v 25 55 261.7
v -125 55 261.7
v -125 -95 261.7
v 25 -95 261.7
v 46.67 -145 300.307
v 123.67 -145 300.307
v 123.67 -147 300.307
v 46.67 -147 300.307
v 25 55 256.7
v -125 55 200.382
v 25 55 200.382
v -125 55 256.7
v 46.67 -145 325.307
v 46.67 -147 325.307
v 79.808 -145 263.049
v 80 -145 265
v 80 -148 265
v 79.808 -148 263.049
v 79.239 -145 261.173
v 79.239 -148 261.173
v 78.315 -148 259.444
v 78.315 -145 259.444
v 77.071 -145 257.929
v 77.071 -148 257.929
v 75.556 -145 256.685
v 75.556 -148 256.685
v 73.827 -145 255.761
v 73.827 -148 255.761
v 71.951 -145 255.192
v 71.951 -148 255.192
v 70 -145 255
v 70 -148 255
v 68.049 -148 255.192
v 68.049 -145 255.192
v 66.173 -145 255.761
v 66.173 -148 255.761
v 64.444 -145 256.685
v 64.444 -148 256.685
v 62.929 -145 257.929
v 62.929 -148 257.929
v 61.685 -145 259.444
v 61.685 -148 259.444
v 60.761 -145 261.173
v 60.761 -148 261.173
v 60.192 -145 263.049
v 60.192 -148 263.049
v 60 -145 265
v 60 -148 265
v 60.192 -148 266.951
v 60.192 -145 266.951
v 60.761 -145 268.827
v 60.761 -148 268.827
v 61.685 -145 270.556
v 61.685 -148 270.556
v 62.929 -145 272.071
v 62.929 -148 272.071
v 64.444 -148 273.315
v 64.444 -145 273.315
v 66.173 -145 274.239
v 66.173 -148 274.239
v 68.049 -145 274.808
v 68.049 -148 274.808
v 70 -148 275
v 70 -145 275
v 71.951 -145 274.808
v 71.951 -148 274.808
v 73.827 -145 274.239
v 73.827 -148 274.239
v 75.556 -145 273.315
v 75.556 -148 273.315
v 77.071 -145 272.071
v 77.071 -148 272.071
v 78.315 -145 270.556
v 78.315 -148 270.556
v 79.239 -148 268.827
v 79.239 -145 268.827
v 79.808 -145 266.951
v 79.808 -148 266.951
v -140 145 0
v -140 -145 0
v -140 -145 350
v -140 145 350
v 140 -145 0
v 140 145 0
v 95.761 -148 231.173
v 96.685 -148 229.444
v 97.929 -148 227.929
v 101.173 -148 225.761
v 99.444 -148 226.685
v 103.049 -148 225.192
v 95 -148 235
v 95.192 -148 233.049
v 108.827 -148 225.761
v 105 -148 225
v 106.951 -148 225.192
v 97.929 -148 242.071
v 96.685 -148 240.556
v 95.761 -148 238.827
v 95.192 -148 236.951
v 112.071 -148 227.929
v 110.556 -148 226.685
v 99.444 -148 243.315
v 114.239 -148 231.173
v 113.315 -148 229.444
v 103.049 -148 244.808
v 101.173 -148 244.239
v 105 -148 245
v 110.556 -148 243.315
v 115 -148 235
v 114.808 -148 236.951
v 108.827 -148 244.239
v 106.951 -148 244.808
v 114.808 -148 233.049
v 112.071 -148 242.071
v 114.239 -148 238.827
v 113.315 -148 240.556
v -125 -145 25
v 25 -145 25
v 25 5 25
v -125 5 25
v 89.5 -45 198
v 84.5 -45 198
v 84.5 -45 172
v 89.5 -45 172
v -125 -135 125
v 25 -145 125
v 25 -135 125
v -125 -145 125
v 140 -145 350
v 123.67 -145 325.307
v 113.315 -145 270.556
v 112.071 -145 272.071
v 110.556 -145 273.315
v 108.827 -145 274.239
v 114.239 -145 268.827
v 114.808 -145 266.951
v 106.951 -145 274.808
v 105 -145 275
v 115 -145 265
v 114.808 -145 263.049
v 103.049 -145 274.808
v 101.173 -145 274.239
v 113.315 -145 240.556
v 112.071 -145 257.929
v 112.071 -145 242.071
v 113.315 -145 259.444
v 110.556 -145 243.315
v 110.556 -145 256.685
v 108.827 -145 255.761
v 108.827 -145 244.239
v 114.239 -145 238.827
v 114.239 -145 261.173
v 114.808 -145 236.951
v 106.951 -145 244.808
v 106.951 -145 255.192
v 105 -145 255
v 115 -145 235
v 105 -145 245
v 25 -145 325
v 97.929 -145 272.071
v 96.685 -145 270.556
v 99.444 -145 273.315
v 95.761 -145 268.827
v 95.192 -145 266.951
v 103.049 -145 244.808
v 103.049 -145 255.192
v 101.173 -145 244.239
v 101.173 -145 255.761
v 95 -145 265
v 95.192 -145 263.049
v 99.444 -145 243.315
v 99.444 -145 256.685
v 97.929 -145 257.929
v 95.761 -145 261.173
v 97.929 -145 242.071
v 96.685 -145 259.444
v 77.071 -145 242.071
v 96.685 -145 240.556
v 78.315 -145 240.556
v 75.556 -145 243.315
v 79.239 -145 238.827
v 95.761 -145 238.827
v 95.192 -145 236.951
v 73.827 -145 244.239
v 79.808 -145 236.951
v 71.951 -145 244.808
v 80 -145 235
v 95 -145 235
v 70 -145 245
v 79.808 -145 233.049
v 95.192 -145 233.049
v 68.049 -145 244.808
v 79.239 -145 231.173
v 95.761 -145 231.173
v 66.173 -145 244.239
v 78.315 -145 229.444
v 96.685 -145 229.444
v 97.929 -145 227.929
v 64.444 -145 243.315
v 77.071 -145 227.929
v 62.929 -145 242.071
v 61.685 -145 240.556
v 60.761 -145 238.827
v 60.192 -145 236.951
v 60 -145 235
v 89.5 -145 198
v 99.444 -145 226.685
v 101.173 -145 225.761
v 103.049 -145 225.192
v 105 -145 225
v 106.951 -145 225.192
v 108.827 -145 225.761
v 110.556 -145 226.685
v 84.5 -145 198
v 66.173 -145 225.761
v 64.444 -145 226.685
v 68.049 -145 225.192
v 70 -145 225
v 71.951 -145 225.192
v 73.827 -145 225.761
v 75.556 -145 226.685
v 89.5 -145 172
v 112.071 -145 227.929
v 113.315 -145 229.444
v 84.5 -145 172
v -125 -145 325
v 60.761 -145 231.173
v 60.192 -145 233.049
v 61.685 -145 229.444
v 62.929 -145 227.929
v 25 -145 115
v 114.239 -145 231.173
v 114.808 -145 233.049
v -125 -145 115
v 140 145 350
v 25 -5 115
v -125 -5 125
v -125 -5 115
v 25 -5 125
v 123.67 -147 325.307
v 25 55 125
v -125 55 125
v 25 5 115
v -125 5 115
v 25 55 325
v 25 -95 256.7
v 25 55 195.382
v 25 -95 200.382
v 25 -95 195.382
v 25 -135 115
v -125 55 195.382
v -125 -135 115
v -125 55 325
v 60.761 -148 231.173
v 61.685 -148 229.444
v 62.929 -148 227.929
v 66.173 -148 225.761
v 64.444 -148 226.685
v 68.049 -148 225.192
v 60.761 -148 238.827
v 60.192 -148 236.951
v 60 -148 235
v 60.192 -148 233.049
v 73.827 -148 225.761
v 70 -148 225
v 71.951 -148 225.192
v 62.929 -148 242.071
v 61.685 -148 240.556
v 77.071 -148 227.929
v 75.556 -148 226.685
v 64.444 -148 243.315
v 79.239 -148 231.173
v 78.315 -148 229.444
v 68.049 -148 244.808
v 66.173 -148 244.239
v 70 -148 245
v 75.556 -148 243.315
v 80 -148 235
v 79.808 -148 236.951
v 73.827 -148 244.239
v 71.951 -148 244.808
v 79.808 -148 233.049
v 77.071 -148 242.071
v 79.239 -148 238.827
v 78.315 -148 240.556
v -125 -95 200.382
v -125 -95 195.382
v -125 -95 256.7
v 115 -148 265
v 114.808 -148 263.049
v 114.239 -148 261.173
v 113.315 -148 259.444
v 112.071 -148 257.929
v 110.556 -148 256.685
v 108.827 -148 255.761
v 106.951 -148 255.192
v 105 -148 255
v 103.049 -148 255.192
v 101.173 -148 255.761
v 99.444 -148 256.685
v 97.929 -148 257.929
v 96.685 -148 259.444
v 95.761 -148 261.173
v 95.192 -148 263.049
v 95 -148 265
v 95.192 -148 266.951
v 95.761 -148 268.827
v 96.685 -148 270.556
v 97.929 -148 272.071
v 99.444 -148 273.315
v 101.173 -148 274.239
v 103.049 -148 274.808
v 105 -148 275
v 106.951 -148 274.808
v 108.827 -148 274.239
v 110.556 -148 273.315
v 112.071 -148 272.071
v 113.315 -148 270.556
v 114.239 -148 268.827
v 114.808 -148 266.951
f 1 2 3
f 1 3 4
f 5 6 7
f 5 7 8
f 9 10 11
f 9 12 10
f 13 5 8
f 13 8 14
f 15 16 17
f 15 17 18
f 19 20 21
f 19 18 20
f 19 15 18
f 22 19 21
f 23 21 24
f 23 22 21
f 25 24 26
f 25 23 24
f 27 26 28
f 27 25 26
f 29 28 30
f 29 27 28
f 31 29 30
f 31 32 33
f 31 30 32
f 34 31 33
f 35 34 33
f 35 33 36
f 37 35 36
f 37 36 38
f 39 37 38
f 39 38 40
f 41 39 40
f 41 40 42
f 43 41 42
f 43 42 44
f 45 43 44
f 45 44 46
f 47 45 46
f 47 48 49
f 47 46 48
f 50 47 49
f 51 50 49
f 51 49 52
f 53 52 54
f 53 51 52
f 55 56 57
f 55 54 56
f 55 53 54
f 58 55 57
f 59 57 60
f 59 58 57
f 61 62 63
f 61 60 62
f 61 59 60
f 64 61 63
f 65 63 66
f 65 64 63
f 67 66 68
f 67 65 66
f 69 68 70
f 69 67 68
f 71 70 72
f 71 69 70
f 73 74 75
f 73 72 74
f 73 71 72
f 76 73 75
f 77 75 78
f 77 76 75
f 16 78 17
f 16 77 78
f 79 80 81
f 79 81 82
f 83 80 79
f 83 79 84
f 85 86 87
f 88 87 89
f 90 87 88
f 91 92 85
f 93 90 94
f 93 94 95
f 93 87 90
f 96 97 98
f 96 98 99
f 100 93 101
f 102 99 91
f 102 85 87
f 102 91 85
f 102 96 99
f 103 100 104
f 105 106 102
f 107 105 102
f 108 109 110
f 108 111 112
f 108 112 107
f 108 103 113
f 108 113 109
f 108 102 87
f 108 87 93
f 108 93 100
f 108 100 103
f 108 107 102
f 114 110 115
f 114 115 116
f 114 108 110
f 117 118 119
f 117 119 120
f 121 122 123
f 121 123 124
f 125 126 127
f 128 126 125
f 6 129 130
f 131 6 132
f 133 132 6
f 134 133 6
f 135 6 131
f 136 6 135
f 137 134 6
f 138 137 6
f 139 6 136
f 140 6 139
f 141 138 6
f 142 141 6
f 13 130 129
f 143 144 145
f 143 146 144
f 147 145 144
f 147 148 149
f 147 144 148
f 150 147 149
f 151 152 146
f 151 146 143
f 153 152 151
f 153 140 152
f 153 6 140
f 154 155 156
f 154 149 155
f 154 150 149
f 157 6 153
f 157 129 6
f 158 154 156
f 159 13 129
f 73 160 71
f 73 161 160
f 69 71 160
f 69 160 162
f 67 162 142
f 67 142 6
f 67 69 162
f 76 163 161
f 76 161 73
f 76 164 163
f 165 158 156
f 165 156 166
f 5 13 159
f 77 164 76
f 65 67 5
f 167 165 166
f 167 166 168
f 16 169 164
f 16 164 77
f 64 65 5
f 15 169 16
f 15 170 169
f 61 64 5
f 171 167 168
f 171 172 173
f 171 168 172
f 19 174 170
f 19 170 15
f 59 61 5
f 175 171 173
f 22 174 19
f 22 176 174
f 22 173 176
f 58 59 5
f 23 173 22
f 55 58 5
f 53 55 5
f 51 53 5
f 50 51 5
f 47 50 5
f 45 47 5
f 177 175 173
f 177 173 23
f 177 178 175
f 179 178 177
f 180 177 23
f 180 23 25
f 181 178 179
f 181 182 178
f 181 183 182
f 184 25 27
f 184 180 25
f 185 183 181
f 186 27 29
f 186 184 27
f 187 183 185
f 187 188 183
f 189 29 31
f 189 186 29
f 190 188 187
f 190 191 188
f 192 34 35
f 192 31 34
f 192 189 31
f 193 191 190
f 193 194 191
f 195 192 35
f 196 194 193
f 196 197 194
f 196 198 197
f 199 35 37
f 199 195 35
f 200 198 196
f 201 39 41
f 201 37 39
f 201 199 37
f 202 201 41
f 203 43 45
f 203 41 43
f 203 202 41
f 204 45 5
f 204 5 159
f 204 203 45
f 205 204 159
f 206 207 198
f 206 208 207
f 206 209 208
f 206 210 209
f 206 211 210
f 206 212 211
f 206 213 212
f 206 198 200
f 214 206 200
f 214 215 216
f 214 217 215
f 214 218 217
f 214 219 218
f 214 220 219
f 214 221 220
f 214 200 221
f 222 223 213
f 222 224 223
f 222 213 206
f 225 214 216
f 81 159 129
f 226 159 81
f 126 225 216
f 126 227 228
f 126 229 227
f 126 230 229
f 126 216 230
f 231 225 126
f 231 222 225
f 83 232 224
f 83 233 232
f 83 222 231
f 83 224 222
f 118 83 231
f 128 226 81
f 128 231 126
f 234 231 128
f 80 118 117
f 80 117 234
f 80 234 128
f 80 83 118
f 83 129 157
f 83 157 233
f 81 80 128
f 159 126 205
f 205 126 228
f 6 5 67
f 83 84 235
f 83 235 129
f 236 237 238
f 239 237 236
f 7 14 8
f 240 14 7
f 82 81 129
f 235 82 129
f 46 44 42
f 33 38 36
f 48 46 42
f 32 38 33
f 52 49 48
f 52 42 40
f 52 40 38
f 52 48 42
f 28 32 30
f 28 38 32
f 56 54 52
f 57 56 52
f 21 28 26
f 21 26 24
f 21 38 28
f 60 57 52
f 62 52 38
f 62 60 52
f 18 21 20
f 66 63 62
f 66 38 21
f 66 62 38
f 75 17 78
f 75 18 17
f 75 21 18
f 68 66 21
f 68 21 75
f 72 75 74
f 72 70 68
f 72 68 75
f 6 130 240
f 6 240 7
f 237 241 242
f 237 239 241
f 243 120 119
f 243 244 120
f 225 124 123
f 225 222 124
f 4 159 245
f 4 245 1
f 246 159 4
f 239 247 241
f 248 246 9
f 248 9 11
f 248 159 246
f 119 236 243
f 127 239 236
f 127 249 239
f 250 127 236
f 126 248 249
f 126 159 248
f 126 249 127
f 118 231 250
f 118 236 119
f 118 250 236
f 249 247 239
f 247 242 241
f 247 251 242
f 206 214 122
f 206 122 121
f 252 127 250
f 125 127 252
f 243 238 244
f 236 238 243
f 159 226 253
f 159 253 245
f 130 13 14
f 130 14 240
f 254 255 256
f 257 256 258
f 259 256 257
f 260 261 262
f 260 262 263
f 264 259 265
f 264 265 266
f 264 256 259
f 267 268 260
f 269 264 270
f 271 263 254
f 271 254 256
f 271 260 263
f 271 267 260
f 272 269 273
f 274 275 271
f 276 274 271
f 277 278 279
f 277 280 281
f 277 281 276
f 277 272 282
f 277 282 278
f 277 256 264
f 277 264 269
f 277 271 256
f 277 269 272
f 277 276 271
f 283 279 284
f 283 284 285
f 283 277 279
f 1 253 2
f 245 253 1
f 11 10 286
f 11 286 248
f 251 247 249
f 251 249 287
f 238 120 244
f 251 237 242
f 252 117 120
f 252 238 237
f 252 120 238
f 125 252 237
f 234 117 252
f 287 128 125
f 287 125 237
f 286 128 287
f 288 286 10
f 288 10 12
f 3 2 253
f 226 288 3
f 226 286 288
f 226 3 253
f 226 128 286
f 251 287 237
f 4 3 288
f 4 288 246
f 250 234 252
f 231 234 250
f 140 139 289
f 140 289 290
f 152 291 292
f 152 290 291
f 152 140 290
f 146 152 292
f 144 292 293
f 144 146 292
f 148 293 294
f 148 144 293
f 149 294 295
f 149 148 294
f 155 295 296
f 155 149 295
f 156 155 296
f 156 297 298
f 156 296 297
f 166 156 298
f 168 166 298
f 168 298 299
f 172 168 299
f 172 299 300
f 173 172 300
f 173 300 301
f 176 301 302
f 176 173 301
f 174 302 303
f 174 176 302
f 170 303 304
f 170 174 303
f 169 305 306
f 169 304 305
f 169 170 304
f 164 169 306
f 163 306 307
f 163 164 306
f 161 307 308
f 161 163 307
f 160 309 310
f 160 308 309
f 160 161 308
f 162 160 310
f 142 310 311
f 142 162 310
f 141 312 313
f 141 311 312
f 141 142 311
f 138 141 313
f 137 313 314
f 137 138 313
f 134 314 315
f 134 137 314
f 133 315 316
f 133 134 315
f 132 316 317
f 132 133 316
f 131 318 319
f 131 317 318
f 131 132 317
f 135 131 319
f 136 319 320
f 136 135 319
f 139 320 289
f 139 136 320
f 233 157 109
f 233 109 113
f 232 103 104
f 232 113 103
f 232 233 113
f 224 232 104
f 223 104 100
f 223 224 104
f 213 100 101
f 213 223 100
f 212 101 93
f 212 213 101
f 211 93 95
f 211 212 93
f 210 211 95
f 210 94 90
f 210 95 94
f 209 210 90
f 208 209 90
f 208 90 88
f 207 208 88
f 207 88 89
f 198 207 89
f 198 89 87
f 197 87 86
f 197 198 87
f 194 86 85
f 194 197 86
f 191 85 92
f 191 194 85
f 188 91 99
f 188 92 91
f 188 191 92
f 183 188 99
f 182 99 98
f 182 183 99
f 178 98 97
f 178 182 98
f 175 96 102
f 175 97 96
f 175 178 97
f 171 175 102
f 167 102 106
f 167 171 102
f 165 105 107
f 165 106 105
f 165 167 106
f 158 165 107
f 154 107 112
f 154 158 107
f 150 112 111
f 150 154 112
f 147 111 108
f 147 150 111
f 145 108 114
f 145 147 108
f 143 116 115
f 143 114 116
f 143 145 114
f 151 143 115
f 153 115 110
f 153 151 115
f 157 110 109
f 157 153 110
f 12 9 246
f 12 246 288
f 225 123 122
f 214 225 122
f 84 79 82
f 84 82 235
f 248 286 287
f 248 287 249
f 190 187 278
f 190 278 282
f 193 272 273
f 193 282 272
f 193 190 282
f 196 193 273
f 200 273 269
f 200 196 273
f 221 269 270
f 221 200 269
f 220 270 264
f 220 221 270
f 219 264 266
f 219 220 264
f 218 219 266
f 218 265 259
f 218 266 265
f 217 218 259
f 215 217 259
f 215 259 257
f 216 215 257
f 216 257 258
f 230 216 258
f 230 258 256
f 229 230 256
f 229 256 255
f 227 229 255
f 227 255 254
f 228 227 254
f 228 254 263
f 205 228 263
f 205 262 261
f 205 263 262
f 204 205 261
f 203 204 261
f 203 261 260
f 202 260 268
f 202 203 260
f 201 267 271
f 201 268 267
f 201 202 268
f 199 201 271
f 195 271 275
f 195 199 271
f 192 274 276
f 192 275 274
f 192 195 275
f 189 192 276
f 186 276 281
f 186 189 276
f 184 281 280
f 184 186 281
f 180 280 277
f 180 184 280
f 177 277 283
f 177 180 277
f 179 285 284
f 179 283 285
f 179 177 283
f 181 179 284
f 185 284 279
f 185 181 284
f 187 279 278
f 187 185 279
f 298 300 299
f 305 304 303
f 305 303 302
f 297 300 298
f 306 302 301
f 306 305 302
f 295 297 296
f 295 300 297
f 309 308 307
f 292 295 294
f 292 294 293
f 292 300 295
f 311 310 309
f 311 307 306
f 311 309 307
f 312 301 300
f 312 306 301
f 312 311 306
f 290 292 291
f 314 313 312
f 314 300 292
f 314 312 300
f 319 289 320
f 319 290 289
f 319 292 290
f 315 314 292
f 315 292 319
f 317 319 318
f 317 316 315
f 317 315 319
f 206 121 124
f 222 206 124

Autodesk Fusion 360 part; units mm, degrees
sketch "Sketch1" plane through (0, 0, 0) normal (0, 0, 1) x (1, 0, 0)
  line L0 (140, -145) -> (-140, -145)
  line L1 (-140, -145) -> (-140, 145)
  line L2 (-140, 145) -> (140, 145)
  line L3 (140, 145) -> (140, -145)
  line L4 (140, -145) -> (-140, 145) construction
  line L5 (-140, -145) -> (140, 145) construction
  dimension "d1" = 280
  dimension "d2" = 290
extrude "Extrude1" add sketch "Sketch1" along normal blind 350
sketch "Sketch2" plane through (0, -145, 0) normal (0, -1, 0) x (1, 0, 0)
  line L0 (-140, 0) -> (140, 0)
  line L1 (140, 0) -> (140, 350)
  line L2 (140, 350) -> (-140, 350)
  line L3 (-140, 350) -> (-140, 0)
  line L4 (25, 125) -> (-125, 125)
  line L5 (-125, 125) -> (-125, 325)
  line L6 (-125, 325) -> (25, 325)
  line L7 (25, 325) -> (25, 125)
  line L8 (25, 125) -> (-125, 325) construction
  line L9 (-125, 125) -> (25, 325) construction
  point P0 (-50, 225)
extrude "Extrude2" cut sketch "Sketch2" against normal blind 200 contours L4 L5 L6 L7
sketch "Sketch3" plane through (0, -145, 0) normal (0, -1, 0) x (1, 0, 0)
  line L0 (-125, 125) -> (-125, 325)
  line L1 (-125, 325) -> (25, 325)
  line L2 (25, 325) -> (25, 125)
  line L3 (25, 125) -> (-125, 125)
  line L4 (-140, 0) -> (140, 0)
  line L5 (140, 0) -> (140, 350)
  line L6 (140, 350) -> (-140, 350)
  line L7 (-140, 350) -> (-140, 0)
  line L8 (123.6698, 300.3073) -> (46.6698, 300.3073)
  line L9 (46.6698, 300.3073) -> (46.6698, 325.3073)
  line L10 (46.6698, 325.3073) -> (123.6698, 325.3073)
  line L11 (123.6698, 325.3073) -> (123.6698, 300.3073)
  line L12 (123.6698, 300.3073) -> (46.6698, 325.3073) construction
  line L13 (46.6698, 300.3073) -> (123.6698, 325.3073) construction
  circle A0 centre (70, 260) radius 9
  circle A1 centre (100, 260) radius 9
  circle A2 centre (70, 230) radius 9
  circle A3 centre (100, 230) radius 9
  line L14 (25, 22.9549) -> (-125, 22.9549)
  line L15 (-125, 22.9549) -> (-125, 112.9549)
  line L16 (-125, 112.9549) -> (25, 112.9549)
  line L17 (25, 112.9549) -> (25, 22.9549)
  line L18 (25, 22.9549) -> (-125, 112.9549) construction
  line L19 (-125, 22.9549) -> (25, 112.9549) construction
  line L20 (85, 185) -> (95, 185)
  line L21 (95, 185) -> (95, 160)
  line L22 (95, 160) -> (85, 160)
  line L23 (85, 160) -> (85, 185)
  point P0 (85.1698, 312.8073)
  point P1 (-50, 67.9549)
  dimension "d7" = 77
  dimension "d8" = 25
  dimension "d9" = 18
  dimension "d10" = 18
  dimension "d11" = 18
  dimension "d12" = 18
  dimension "d13" = 150
  dimension "d14" = 90
extrude "Extrude3" add sketch "Sketch3" along normal blind 2 contours L8 L9 L10 L11
sketch "Sketch4" plane through (0, 55, 0) normal (0, -1, 0) x (1, 0, 0)
  line L0 (25, 325) -> (-125, 325)
  line L1 (-125, 325) -> (-125, 125)
  line L2 (-125, 125) -> (25, 125)
  line L3 (25, 125) -> (25, 325)
  line L4 (-125, 200.3816) -> (25, 200.3816)
  line L5 (25, 200.3816) -> (25, 195.3816)
  line L6 (25, 195.3816) -> (-125, 195.3816)
  line L7 (-125, 195.3816) -> (-125, 200.3816)
  line L8 (-125, 261.7004) -> (25, 261.7004)
  line L9 (25, 261.7004) -> (25, 256.7004)
  line L10 (25, 256.7004) -> (-125, 256.7004)
  line L11 (-125, 256.7004) -> (-125, 261.7004)
  dimension "d17" = 5
  dimension "d18" = 150
  dimension "d19" = 5
extrude "Extrude4" add sketch "Sketch4" along normal blind 150 contours L1 L3 L8 L9 L10 L11 | L1 L3 L4 L5 L6 L7
sketch "Sketch5" plane through (0, 0, 125) normal (0, 0, 1) x (-1, 0, 0)
  line L0 (125, 145) -> (-25, 145)
  line L1 (-25, 145) -> (-25, -55)
  line L2 (-25, -55) -> (125, -55)
  line L3 (125, -55) -> (125, 145)
  line L4 (-25, 135) -> (125, 135)
  line L5 (125, 135) -> (125, 5)
  line L6 (125, 5) -> (-25, 5)
  line L7 (-25, 5) -> (-25, 135)
  line L8 (-25, 135) -> (125, 5) construction
  line L9 (125, 135) -> (-25, 5) construction
  point P0 (50, 70)
  dimension "d22" = 130
extrude "Extrude5" cut sketch "Sketch5" against normal blind 75 contours L1 L3 L4 L5 L6 L7
sketch "Sketch6" plane through (0, -145, 0) normal (0, -1, 0) x (1, 0, 0)
  line L0 (123.6698, 325.3073) -> (123.6698, 300.3073)
  line L1 (123.6698, 300.3073) -> (46.6698, 300.3073)
  line L2 (46.6698, 300.3073) -> (46.6698, 325.3073)
  line L3 (46.6698, 325.3073) -> (123.6698, 325.3073)
  line L4 (-125, 125) -> (-125, 325)
  line L5 (-125, 325) -> (25, 325)
  line L6 (25, 325) -> (25, 125)
  line L7 (25, 125) -> (-125, 125)
  line L8 (-140, 0) -> (140, 0)
  line L9 (140, 0) -> (140, 350)
  line L10 (140, 350) -> (-140, 350)
  line L11 (-140, 350) -> (-140, 0)
  line L12 (25, 25) -> (-125, 25)
  line L13 (-125, 25) -> (-125, 115)
  line L14 (-125, 115) -> (25, 115)
  line L15 (25, 115) -> (25, 25)
  line L16 (25, 25) -> (-125, 115) construction
  line L17 (-125, 25) -> (25, 115) construction
  point P0 (-50, 70)
  dimension "d25" = 150
  dimension "d26" = 90
extrude "Extrude6" cut sketch "Sketch6" against normal blind 150 contours L12 L13 L14 L15
sketch "Sketch7" plane through (0, -145, 0) normal (0, -1, 0) x (1, 0, 0)
  line L0 (-125, 25) -> (-125, 115)
  line L1 (-125, 115) -> (25, 115)
  line L2 (25, 115) -> (25, 25)
  line L3 (25, 25) -> (-125, 25)
  line L4 (123.6698, 325.3073) -> (123.6698, 300.3073)
  line L5 (123.6698, 300.3073) -> (46.6698, 300.3073)
  line L6 (46.6698, 300.3073) -> (46.6698, 325.3073)
  line L7 (46.6698, 325.3073) -> (123.6698, 325.3073)
  line L8 (-125, 125) -> (-125, 325)
  line L9 (-125, 325) -> (25, 325)
  line L10 (25, 325) -> (25, 125)
  line L11 (25, 125) -> (-125, 125)
  line L12 (-140, 0) -> (140, 0)
  line L13 (140, 0) -> (140, 350)
  line L14 (140, 350) -> (-140, 350)
  line L15 (-140, 350) -> (-140, 0)
  circle A0 centre (70, 265) radius 10
  circle A1 centre (105, 265) radius 10
  circle A2 centre (70, 235) radius 10
  circle A3 centre (105, 235) radius 10
  dimension "d29" = 20
  dimension "d30" = 20
  dimension "d31" = 20
  dimension "d32" = 20
extrude "Extrude7" add sketch "Sketch7" along normal blind 3 contours A0 | A1 | A2 | A3
sketch "Sketch8" plane through (0, -145, 0) normal (0, -1, 0) x (1, 0, 0)
  circle A0 centre (105, 235) radius 10
  circle A1 centre (70, 265) radius 10
  circle A2 centre (70, 235) radius 10
  circle A3 centre (105, 265) radius 10
  line L0 (-125, 25) -> (-125, 115)
  line L1 (-125, 115) -> (25, 115)
  line L2 (25, 115) -> (25, 25)
  line L3 (25, 25) -> (-125, 25)
  line L4 (123.6698, 325.3073) -> (123.6698, 300.3073)
  line L5 (123.6698, 300.3073) -> (46.6698, 300.3073)
  line L6 (46.6698, 300.3073) -> (46.6698, 325.3073)
  line L7 (46.6698, 325.3073) -> (123.6698, 325.3073)
  line L8 (-125, 125) -> (-125, 325)
  line L9 (-125, 325) -> (25, 325)
  line L10 (25, 325) -> (25, 125)
  line L11 (25, 125) -> (-125, 125)
  line L12 (-140, 0) -> (140, 0)
  line L13 (140, 0) -> (140, 350)
  line L14 (140, 350) -> (-140, 350)
  line L15 (-140, 350) -> (-140, 0)
  line L16 (89.5, 172) -> (84.5, 172)
  line L17 (84.5, 172) -> (84.5, 198)
  line L18 (84.5, 198) -> (89.5, 198)
  line L19 (89.5, 198) -> (89.5, 172)
  line L20 (89.5, 172) -> (84.5, 198) construction
  line L21 (84.5, 172) -> (89.5, 198) construction
  point P0 (87, 185)
  dimension "d35" = 5
  dimension "d36" = 26
extrude "Extrude8" cut sketch "Sketch8" against normal blind 100 contours L16 L17 L18 L19
